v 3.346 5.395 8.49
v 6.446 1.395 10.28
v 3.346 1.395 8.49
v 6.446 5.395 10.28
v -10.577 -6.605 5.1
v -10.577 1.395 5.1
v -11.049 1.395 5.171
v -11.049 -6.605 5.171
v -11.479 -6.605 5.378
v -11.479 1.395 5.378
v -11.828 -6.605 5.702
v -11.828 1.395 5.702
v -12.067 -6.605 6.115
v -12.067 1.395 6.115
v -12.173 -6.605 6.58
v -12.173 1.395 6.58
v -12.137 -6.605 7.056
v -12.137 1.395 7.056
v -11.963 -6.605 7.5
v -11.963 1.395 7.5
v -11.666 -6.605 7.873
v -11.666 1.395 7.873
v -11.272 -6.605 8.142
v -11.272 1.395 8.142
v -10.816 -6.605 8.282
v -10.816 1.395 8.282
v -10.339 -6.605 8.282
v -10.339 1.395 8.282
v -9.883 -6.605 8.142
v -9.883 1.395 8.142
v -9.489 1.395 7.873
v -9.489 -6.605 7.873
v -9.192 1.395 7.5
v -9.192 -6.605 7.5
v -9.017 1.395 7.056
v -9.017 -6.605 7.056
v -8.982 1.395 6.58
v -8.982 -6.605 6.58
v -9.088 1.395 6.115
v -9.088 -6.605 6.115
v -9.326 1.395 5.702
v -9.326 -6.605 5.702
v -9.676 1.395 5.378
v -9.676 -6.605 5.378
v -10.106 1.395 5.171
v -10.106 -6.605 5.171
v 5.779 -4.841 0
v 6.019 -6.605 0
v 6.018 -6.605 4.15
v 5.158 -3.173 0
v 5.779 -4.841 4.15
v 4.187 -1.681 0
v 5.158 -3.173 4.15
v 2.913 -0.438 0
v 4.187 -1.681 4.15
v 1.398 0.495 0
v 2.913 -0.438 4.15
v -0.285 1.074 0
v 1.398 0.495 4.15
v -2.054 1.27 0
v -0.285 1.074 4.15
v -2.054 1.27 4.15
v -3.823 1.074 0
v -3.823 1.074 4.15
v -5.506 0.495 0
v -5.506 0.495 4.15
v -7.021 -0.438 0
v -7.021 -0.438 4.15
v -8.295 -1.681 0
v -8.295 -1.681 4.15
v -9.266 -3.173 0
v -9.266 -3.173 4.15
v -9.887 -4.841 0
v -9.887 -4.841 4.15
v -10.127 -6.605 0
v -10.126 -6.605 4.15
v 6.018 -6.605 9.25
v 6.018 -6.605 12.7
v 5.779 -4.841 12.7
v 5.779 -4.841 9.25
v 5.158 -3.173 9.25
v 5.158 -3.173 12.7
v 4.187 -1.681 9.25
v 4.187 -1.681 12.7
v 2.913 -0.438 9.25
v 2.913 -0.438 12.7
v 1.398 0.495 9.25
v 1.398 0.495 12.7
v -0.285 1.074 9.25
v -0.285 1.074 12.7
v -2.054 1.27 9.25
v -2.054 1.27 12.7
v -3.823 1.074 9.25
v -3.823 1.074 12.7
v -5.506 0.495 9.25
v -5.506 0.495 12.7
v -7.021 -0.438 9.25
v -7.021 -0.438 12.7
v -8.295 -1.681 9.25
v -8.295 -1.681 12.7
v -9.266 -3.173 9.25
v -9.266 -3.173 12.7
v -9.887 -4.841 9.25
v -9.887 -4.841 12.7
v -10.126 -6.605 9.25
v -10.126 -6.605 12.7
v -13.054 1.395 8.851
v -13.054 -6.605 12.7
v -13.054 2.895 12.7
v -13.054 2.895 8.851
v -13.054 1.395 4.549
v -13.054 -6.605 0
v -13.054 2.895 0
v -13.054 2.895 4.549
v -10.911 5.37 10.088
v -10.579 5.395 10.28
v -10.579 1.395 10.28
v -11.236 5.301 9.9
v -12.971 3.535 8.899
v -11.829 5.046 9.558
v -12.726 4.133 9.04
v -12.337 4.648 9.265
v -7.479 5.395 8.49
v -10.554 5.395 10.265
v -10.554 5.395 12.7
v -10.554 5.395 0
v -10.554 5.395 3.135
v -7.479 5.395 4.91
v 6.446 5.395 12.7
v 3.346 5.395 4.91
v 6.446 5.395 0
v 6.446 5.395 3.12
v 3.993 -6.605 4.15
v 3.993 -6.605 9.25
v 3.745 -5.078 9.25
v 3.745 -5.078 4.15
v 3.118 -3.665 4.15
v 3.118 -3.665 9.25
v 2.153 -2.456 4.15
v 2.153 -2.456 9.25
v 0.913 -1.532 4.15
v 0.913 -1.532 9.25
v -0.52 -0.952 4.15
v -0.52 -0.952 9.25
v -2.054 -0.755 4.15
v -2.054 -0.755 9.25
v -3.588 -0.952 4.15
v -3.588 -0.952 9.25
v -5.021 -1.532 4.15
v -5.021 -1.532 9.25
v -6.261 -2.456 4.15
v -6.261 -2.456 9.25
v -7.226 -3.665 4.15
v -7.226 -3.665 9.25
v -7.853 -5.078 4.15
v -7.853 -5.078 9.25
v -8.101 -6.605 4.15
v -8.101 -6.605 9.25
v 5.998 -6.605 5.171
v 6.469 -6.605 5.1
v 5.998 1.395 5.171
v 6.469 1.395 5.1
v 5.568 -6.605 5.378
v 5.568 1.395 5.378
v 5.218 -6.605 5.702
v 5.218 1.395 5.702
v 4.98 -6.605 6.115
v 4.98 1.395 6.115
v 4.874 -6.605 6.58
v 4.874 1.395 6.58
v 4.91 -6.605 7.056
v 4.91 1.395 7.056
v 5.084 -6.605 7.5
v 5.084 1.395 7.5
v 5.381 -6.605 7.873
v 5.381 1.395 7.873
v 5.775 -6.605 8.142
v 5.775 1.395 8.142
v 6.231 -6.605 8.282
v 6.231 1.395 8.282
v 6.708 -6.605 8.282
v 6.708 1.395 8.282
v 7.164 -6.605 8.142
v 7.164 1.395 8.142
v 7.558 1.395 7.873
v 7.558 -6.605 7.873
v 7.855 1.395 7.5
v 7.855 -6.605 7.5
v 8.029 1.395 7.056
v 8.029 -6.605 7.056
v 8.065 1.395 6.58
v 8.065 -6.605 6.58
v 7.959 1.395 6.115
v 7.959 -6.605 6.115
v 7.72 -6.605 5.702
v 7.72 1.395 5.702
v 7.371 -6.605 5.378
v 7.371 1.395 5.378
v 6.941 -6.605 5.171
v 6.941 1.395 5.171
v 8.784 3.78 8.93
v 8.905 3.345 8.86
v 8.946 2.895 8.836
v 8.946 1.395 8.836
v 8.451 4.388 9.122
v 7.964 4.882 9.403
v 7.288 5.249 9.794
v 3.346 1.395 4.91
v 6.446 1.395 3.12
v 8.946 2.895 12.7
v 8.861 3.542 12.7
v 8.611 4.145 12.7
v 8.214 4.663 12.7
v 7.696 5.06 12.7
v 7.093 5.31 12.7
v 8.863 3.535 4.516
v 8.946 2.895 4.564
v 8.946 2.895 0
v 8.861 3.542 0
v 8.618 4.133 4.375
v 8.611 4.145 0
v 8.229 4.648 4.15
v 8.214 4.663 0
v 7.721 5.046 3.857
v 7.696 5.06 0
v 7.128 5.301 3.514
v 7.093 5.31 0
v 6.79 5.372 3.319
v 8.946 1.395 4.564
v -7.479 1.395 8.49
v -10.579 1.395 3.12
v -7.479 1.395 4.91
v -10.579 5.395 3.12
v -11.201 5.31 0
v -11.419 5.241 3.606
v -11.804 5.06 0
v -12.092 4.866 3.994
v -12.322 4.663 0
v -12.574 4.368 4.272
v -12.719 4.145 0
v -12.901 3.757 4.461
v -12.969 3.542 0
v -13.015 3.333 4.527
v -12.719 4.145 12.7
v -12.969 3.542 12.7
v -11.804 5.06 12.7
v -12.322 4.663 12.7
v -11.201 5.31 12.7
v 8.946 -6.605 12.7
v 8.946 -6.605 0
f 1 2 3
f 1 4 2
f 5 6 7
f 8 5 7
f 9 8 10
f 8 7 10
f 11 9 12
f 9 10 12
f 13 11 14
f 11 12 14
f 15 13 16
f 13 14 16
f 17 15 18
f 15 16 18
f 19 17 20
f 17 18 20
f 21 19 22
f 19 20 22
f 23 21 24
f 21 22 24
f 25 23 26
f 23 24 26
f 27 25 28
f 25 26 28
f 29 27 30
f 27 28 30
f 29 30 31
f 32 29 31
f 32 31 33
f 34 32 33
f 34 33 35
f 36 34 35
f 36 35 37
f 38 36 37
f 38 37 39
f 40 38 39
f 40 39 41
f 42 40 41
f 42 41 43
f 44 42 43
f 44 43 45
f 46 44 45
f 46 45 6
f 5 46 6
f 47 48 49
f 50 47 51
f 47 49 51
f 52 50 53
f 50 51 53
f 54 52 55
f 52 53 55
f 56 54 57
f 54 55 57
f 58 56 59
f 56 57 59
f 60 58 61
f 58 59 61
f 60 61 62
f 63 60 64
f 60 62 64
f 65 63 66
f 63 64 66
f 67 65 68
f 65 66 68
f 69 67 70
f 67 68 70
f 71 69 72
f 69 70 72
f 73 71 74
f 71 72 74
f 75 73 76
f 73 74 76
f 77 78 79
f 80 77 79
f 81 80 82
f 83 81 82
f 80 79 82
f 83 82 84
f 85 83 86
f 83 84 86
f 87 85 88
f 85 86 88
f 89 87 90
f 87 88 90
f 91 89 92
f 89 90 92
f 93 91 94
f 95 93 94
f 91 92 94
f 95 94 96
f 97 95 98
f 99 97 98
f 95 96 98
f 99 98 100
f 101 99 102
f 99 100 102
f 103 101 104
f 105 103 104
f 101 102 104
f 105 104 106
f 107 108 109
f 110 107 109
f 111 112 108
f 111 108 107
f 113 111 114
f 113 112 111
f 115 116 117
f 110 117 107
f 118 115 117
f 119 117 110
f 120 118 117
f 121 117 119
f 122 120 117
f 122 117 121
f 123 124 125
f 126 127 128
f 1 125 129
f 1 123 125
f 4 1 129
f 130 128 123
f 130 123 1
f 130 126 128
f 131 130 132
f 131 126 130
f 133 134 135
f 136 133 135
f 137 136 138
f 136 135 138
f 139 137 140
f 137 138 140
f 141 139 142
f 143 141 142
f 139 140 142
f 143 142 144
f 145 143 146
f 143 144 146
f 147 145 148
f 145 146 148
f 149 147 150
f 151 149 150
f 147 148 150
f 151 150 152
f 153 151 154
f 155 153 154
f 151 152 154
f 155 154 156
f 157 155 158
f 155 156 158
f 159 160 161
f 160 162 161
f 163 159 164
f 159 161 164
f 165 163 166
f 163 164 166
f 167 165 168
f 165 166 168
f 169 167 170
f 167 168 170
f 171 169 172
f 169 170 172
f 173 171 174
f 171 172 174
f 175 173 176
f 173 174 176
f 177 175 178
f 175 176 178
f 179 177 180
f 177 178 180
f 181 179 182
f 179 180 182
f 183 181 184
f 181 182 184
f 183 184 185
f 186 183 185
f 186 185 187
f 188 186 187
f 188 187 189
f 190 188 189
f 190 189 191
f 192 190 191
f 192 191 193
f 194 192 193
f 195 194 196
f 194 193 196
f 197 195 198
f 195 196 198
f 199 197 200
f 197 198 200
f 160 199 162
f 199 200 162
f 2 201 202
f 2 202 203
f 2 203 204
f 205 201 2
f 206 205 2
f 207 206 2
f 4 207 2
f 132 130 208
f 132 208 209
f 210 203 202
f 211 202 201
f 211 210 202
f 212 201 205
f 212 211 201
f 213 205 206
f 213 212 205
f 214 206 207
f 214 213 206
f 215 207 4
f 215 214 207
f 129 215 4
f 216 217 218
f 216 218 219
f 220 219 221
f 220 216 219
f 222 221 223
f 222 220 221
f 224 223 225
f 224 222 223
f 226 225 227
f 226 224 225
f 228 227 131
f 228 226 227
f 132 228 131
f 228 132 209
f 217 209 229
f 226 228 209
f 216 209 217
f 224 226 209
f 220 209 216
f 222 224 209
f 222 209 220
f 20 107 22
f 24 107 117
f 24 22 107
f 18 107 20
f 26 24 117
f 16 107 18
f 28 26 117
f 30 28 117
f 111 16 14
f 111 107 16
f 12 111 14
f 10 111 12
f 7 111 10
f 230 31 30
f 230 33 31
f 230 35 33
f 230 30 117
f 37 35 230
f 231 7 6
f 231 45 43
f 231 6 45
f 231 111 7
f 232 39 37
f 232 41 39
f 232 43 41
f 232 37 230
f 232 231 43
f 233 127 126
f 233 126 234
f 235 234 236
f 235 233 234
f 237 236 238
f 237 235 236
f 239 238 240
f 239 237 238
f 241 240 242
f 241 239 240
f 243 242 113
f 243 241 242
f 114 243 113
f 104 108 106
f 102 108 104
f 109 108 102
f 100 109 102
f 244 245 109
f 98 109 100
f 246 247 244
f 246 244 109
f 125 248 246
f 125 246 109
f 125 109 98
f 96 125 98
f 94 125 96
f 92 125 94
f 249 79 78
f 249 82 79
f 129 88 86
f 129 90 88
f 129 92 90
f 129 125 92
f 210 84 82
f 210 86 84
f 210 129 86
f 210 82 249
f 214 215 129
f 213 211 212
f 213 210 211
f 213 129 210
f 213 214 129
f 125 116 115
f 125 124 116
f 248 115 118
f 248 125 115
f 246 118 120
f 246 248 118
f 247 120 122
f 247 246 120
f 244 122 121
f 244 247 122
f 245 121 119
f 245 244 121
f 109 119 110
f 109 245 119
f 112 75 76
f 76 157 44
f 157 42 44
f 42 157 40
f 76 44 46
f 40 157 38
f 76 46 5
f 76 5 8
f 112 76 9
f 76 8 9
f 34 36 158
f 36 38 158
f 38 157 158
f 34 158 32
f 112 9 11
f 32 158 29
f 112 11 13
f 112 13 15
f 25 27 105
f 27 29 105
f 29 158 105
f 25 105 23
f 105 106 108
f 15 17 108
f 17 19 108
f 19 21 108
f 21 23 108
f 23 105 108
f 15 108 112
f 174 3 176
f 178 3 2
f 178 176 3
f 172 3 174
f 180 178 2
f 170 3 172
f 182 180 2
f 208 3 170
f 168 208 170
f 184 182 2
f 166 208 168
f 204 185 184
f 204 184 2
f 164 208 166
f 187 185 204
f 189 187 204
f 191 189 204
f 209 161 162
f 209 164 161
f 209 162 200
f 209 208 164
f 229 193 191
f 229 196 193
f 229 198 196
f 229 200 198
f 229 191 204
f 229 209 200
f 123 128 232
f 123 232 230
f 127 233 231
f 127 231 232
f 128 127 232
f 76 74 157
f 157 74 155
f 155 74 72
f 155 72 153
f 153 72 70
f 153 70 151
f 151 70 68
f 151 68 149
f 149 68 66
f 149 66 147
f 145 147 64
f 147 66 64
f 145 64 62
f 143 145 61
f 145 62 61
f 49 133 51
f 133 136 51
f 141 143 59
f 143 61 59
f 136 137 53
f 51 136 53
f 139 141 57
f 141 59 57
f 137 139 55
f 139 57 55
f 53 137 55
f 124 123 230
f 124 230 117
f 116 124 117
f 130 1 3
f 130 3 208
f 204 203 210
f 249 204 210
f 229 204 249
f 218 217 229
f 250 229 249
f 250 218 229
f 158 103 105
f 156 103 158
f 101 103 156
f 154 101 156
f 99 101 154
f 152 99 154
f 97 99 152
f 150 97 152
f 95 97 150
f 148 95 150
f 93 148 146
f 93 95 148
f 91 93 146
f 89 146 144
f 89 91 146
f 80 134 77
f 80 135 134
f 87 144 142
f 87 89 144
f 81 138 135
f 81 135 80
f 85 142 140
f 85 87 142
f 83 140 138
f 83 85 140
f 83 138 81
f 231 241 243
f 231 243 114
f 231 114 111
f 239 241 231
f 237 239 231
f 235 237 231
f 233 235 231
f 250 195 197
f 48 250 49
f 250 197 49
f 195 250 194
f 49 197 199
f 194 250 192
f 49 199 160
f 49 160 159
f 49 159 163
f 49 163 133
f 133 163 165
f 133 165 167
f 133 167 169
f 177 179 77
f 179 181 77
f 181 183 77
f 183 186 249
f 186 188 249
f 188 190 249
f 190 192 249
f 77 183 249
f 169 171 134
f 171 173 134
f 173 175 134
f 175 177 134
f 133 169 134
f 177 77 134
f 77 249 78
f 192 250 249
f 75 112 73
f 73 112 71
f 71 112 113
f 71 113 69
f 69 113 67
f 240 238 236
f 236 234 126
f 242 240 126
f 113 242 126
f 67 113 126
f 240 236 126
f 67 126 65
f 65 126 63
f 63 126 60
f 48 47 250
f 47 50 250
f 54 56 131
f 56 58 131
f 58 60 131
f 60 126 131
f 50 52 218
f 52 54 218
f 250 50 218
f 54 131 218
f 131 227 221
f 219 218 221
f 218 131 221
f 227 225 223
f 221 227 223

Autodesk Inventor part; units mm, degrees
ref_plane "YZ Plane" through (0, 0, 0) normal (1, 0, 0) x (0, 1, 0)
ref_plane "XZ Plane" through (0, 0, 0) normal (0, 1, 0) x (-1, 0, 0)
ref_plane "XY Plane" through (0, 0, 0) normal (0, 0, 1) x (1, 0, 0)
sketch "Szkic1" plane through (0, 0, 0) normal (0, 0, 1) x (1, 0, 0)
  line L0 (-13.054, 5.3954) -> (8.946, 5.3954)
  line L1 (8.946, 5.3954) -> (8.946, -6.6046)
  line L2 (8.946, -6.6046) -> (-13.054, -6.6046)
  line L3 (-13.054, -6.6046) -> (-13.054, 5.3954)
  point P0 (0, 0)
  dimension "d0" = 22
  dimension "d1" = 12
extrude "Wyciągnięcie proste1" add sketch "Szkic1" along normal blind 12.7
fillet "Zaokrąglenie1" radius 2.5 2 edges at (-13.054, 5.3954, 6.35) (8.946, 5.3954, 6.35)
sketch "Szkic2" plane through (0, 0, 12.7) normal (0, 0, 1) x (1, 0, 0)
  line L0 (8.946, -6.6046) -> (8.946, 2.8954) projected
  line L1 (-13.054, 2.8954) -> (-13.054, -6.6046) projected
  circle A0 centre (-2.054, -6.8046) radius 8.075
  line L2 (6.446, 5.3954) -> (-10.554, 5.3954) projected
  point P0 (0, 0)
  dimension "d5" = 22
  dimension "d6" = 11
  dimension "d7" = 16.15
  dimension "d10" = 12.2
extrude "Wyciągnięcie proste2" cut sketch "Szkic2" against normal blind 12.7
sketch "Szkic3" plane through (0, 0, 12.7) normal (0, 0, 1) x (1, 0, 0)
  arc A0 (6.0185, -6.6046) -> (-10.1265, -6.6046) centre (-2.054, -6.8046) ccw projected
  line L0 (6.0185, -6.6046) -> (8.946, -6.6046) projected
  line L1 (8.946, -6.6046) -> (8.946, 2.8954) projected
  arc A1 (8.946, 2.8954) -> (6.446, 5.3954) centre (6.446, 2.8954) ccw projected
  line L2 (6.446, 5.3954) -> (-10.554, 5.3954) projected
  arc A2 (-10.554, 5.3954) -> (-13.054, 2.8954) centre (-10.554, 2.8954) ccw projected
  line L3 (-13.054, 2.8954) -> (-13.054, -6.6046) projected
  line L4 (-13.054, -6.6046) -> (-10.1265, -6.6046) projected
  arc A3 (3.9927, -6.6046) -> (-8.1007, -6.6046) centre (-2.054, -6.8046) ccw
  arc A4 (6.0185, -6.6046) -> (-10.1265, -6.6046) centre (-2.054, -6.8046) ccw projected
  line L5 (6.0185, -6.6046) -> (-10.1265, -6.6046)
  point P0 (0, 0)
  dimension "d11" = 12.1
extrude "Wyciągnięcie proste3" add sketch "Szkic3" against normal blind 8.55 contours L5 A3 A0
extrude "Wyciągnięcie proste4" cut sketch "Szkic3" against normal blind 3.45 contours L5 A3 A0
sketch "Szkic4" plane through (-13.054, -6.6046, 0) normal (0, -1, 0) x (1, 0, 0)
  line L0 (0, 0) -> (0, 12.7) projected
  line L1 (22, 0) -> (22, 12.7) projected
  line L2 (4.9533, 9.25) -> (2.9275, 9.25) projected
  line L3 (19.0725, 9.25) -> (17.0467, 9.25) projected
  line L4 (4.9533, 9.25) -> (4.9533, 4.15) projected
  line L5 (4.9533, 4.15) -> (2.9275, 4.15) projected
  point P0 (13.054, 0)
  point P1 (2.4767, 6.7)
  point P2 (19.5233, 6.7)
  dimension "d16" = 2.4766
  dimension "d17" = 2.4766
  dimension "d18" = 2.55
  dimension "d19" = 2.55
  dimension "d33" = 4.9533
  dimension "d34" = 5.1
hole "Otwór1" at (-10.5773, -6.6046, 6.7) at (6.4694, -6.6046, 6.7) direction (0, 1, 0) diameter 3.2 end through all
sketch "Szkic5" plane through (-10.554, 5.3954, 0) normal (0, 1, 0) x (1, 0, 0)
  arc A0 (0, -8.2998) -> (0, -5.1002) centre (-0.0233, -6.7) ccw projected
  line L0 (0, -12.7) -> (0, -8.2998) projected
  line L1 (17, -12.7) -> (0, -12.7) projected
  line L2 (17, -8.2998) -> (17, -12.7) projected
  arc A1 (17, -5.1002) -> (17, -8.2998) centre (17.0233, -6.7) ccw projected
  line L3 (17, 0) -> (17, -5.1002) projected
  line L4 (0, 0) -> (17, 0) projected
  line L5 (0, -5.1002) -> (0, 0) projected
  line L6 (19.5, -12.7) -> (19.5, 0) projected
  line L7 (-2.5, 0) -> (-2.5, -12.7) projected
  line L8 (-3.125, -4.9102) -> (-0.025, -3.1204)
  line L9 (-0.025, -3.1204) -> (3.075, -4.9102)
  line L10 (3.075, -4.9102) -> (3.075, -8.4898)
  line L11 (3.075, -8.4898) -> (-0.025, -10.2796)
  line L12 (-0.025, -10.2796) -> (-3.125, -8.4898)
  line L13 (-3.125, -8.4898) -> (-3.125, -4.9102)
  line L14 (13.9, -4.9102) -> (17, -3.1204)
  line L15 (17, -3.1204) -> (20.1, -4.9102)
  line L16 (20.1, -4.9102) -> (20.1, -8.4898)
  line L17 (20.1, -8.4898) -> (17, -10.2796)
  line L18 (17, -10.2796) -> (13.9, -8.4898)
  line L19 (13.9, -8.4898) -> (13.9, -4.9102)
  point P0 (10.554, 0)
  point P1 (17, -6.7)
  point P2 (-0.025, -6.7)
  point P3 (-0.025, -6.7)
  point P4 (-3.125, -6.7)
  point P5 (17, -6.7)
  point P6 (13.9, -6.7)
extrude "Wyciągnięcie proste6" cut sketch "Szkic5" against normal blind 4 contours L0 L11 L12 L7 L8 L9 L5 A0 | A0 L5 L9 L10 L11 L0 | L12 L13 L8 L7 | L18 L19 L14 L3 A1 L2 | L2 A1 L3 L15 L6 L17 | L6 L15 L16 L17
equation "\"d6\" = 0.5 * d5"
equation "\"d16\" = 0.5 * d33"
equation "\"d17\" = d16"
equation "\"d18\" = 0.5 * d34"
equation "\"d19\" = d18"
properties part number "3DP_ABS_E3DV6_Mounting_Clamp"
